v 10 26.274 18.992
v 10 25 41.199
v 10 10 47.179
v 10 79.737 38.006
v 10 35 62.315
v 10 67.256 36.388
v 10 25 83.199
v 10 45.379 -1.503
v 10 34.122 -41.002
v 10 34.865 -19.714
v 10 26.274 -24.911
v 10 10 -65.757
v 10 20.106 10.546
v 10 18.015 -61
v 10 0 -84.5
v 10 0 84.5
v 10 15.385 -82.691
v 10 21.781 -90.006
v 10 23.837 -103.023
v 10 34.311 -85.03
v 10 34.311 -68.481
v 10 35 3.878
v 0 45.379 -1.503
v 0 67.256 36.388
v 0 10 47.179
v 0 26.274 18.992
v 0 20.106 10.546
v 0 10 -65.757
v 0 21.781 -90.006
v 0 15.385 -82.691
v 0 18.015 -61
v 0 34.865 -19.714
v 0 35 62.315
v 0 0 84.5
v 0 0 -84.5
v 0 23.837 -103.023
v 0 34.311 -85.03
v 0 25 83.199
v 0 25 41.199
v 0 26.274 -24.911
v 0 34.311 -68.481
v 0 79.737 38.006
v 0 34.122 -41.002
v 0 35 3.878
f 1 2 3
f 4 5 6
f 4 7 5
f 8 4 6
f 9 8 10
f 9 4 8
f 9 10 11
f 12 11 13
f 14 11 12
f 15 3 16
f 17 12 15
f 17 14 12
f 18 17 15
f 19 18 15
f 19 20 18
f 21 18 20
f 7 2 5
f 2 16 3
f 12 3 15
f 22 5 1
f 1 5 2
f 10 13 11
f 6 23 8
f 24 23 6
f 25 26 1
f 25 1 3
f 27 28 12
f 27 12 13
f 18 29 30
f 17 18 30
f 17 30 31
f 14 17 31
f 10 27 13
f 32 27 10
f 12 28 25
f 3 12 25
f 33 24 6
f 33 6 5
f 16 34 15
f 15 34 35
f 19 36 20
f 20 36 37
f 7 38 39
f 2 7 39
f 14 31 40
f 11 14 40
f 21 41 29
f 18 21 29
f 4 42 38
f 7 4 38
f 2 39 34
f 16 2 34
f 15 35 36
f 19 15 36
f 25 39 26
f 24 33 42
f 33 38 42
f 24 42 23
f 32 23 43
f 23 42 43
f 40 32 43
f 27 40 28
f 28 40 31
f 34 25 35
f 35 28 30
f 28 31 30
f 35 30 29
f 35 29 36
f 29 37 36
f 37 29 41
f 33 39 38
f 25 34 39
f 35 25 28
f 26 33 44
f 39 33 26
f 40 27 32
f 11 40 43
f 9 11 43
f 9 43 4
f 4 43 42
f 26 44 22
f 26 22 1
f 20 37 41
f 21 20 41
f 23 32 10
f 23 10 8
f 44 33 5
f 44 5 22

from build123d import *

# Parameters (mm, degrees)
BOSS_EXTRUDE1_DEPTH = 10


with BuildPart() as part:
    # Sketch1 → Boss-Extrude1 (new body)
    with BuildSketch(Plane(origin=(0, 0, 0), x_dir=(0, 0, -1), z_dir=(1, 0, 0))):
        Polygon((-84.5, 0), (84.5, 0), (103.022719545, 23.837300471), (85.030260907, 34.310612808), (68.481056011, 34.310612808), (90.006488303, 21.780775717), (82.690523765, 15.385421213), (60.999669369, 18.014714385), (24.911453349, 26.273949517), (41.001886779, 34.121778265), (-38.005922344, 79.73695813), (-83.198729811, 25), (-41.198729811, 25), align=None)
        Polygon((-47.179491924, 10), (-7.44944599, 10), (29.988283091, 10), (65.756507922, 10), (-10.545839316, 20.106291787), (19.714317813, 34.865156554), (1.503401285, 45.379234114), (-36.387555456, 67.255588188), (-62.314964122, 35), (-3.878221735, 35), (-18.992184521, 26.273949517), align=None, mode=Mode.SUBTRACT)
    extrude(amount=BOSS_EXTRUDE1_DEPTH)


solid = part.part
